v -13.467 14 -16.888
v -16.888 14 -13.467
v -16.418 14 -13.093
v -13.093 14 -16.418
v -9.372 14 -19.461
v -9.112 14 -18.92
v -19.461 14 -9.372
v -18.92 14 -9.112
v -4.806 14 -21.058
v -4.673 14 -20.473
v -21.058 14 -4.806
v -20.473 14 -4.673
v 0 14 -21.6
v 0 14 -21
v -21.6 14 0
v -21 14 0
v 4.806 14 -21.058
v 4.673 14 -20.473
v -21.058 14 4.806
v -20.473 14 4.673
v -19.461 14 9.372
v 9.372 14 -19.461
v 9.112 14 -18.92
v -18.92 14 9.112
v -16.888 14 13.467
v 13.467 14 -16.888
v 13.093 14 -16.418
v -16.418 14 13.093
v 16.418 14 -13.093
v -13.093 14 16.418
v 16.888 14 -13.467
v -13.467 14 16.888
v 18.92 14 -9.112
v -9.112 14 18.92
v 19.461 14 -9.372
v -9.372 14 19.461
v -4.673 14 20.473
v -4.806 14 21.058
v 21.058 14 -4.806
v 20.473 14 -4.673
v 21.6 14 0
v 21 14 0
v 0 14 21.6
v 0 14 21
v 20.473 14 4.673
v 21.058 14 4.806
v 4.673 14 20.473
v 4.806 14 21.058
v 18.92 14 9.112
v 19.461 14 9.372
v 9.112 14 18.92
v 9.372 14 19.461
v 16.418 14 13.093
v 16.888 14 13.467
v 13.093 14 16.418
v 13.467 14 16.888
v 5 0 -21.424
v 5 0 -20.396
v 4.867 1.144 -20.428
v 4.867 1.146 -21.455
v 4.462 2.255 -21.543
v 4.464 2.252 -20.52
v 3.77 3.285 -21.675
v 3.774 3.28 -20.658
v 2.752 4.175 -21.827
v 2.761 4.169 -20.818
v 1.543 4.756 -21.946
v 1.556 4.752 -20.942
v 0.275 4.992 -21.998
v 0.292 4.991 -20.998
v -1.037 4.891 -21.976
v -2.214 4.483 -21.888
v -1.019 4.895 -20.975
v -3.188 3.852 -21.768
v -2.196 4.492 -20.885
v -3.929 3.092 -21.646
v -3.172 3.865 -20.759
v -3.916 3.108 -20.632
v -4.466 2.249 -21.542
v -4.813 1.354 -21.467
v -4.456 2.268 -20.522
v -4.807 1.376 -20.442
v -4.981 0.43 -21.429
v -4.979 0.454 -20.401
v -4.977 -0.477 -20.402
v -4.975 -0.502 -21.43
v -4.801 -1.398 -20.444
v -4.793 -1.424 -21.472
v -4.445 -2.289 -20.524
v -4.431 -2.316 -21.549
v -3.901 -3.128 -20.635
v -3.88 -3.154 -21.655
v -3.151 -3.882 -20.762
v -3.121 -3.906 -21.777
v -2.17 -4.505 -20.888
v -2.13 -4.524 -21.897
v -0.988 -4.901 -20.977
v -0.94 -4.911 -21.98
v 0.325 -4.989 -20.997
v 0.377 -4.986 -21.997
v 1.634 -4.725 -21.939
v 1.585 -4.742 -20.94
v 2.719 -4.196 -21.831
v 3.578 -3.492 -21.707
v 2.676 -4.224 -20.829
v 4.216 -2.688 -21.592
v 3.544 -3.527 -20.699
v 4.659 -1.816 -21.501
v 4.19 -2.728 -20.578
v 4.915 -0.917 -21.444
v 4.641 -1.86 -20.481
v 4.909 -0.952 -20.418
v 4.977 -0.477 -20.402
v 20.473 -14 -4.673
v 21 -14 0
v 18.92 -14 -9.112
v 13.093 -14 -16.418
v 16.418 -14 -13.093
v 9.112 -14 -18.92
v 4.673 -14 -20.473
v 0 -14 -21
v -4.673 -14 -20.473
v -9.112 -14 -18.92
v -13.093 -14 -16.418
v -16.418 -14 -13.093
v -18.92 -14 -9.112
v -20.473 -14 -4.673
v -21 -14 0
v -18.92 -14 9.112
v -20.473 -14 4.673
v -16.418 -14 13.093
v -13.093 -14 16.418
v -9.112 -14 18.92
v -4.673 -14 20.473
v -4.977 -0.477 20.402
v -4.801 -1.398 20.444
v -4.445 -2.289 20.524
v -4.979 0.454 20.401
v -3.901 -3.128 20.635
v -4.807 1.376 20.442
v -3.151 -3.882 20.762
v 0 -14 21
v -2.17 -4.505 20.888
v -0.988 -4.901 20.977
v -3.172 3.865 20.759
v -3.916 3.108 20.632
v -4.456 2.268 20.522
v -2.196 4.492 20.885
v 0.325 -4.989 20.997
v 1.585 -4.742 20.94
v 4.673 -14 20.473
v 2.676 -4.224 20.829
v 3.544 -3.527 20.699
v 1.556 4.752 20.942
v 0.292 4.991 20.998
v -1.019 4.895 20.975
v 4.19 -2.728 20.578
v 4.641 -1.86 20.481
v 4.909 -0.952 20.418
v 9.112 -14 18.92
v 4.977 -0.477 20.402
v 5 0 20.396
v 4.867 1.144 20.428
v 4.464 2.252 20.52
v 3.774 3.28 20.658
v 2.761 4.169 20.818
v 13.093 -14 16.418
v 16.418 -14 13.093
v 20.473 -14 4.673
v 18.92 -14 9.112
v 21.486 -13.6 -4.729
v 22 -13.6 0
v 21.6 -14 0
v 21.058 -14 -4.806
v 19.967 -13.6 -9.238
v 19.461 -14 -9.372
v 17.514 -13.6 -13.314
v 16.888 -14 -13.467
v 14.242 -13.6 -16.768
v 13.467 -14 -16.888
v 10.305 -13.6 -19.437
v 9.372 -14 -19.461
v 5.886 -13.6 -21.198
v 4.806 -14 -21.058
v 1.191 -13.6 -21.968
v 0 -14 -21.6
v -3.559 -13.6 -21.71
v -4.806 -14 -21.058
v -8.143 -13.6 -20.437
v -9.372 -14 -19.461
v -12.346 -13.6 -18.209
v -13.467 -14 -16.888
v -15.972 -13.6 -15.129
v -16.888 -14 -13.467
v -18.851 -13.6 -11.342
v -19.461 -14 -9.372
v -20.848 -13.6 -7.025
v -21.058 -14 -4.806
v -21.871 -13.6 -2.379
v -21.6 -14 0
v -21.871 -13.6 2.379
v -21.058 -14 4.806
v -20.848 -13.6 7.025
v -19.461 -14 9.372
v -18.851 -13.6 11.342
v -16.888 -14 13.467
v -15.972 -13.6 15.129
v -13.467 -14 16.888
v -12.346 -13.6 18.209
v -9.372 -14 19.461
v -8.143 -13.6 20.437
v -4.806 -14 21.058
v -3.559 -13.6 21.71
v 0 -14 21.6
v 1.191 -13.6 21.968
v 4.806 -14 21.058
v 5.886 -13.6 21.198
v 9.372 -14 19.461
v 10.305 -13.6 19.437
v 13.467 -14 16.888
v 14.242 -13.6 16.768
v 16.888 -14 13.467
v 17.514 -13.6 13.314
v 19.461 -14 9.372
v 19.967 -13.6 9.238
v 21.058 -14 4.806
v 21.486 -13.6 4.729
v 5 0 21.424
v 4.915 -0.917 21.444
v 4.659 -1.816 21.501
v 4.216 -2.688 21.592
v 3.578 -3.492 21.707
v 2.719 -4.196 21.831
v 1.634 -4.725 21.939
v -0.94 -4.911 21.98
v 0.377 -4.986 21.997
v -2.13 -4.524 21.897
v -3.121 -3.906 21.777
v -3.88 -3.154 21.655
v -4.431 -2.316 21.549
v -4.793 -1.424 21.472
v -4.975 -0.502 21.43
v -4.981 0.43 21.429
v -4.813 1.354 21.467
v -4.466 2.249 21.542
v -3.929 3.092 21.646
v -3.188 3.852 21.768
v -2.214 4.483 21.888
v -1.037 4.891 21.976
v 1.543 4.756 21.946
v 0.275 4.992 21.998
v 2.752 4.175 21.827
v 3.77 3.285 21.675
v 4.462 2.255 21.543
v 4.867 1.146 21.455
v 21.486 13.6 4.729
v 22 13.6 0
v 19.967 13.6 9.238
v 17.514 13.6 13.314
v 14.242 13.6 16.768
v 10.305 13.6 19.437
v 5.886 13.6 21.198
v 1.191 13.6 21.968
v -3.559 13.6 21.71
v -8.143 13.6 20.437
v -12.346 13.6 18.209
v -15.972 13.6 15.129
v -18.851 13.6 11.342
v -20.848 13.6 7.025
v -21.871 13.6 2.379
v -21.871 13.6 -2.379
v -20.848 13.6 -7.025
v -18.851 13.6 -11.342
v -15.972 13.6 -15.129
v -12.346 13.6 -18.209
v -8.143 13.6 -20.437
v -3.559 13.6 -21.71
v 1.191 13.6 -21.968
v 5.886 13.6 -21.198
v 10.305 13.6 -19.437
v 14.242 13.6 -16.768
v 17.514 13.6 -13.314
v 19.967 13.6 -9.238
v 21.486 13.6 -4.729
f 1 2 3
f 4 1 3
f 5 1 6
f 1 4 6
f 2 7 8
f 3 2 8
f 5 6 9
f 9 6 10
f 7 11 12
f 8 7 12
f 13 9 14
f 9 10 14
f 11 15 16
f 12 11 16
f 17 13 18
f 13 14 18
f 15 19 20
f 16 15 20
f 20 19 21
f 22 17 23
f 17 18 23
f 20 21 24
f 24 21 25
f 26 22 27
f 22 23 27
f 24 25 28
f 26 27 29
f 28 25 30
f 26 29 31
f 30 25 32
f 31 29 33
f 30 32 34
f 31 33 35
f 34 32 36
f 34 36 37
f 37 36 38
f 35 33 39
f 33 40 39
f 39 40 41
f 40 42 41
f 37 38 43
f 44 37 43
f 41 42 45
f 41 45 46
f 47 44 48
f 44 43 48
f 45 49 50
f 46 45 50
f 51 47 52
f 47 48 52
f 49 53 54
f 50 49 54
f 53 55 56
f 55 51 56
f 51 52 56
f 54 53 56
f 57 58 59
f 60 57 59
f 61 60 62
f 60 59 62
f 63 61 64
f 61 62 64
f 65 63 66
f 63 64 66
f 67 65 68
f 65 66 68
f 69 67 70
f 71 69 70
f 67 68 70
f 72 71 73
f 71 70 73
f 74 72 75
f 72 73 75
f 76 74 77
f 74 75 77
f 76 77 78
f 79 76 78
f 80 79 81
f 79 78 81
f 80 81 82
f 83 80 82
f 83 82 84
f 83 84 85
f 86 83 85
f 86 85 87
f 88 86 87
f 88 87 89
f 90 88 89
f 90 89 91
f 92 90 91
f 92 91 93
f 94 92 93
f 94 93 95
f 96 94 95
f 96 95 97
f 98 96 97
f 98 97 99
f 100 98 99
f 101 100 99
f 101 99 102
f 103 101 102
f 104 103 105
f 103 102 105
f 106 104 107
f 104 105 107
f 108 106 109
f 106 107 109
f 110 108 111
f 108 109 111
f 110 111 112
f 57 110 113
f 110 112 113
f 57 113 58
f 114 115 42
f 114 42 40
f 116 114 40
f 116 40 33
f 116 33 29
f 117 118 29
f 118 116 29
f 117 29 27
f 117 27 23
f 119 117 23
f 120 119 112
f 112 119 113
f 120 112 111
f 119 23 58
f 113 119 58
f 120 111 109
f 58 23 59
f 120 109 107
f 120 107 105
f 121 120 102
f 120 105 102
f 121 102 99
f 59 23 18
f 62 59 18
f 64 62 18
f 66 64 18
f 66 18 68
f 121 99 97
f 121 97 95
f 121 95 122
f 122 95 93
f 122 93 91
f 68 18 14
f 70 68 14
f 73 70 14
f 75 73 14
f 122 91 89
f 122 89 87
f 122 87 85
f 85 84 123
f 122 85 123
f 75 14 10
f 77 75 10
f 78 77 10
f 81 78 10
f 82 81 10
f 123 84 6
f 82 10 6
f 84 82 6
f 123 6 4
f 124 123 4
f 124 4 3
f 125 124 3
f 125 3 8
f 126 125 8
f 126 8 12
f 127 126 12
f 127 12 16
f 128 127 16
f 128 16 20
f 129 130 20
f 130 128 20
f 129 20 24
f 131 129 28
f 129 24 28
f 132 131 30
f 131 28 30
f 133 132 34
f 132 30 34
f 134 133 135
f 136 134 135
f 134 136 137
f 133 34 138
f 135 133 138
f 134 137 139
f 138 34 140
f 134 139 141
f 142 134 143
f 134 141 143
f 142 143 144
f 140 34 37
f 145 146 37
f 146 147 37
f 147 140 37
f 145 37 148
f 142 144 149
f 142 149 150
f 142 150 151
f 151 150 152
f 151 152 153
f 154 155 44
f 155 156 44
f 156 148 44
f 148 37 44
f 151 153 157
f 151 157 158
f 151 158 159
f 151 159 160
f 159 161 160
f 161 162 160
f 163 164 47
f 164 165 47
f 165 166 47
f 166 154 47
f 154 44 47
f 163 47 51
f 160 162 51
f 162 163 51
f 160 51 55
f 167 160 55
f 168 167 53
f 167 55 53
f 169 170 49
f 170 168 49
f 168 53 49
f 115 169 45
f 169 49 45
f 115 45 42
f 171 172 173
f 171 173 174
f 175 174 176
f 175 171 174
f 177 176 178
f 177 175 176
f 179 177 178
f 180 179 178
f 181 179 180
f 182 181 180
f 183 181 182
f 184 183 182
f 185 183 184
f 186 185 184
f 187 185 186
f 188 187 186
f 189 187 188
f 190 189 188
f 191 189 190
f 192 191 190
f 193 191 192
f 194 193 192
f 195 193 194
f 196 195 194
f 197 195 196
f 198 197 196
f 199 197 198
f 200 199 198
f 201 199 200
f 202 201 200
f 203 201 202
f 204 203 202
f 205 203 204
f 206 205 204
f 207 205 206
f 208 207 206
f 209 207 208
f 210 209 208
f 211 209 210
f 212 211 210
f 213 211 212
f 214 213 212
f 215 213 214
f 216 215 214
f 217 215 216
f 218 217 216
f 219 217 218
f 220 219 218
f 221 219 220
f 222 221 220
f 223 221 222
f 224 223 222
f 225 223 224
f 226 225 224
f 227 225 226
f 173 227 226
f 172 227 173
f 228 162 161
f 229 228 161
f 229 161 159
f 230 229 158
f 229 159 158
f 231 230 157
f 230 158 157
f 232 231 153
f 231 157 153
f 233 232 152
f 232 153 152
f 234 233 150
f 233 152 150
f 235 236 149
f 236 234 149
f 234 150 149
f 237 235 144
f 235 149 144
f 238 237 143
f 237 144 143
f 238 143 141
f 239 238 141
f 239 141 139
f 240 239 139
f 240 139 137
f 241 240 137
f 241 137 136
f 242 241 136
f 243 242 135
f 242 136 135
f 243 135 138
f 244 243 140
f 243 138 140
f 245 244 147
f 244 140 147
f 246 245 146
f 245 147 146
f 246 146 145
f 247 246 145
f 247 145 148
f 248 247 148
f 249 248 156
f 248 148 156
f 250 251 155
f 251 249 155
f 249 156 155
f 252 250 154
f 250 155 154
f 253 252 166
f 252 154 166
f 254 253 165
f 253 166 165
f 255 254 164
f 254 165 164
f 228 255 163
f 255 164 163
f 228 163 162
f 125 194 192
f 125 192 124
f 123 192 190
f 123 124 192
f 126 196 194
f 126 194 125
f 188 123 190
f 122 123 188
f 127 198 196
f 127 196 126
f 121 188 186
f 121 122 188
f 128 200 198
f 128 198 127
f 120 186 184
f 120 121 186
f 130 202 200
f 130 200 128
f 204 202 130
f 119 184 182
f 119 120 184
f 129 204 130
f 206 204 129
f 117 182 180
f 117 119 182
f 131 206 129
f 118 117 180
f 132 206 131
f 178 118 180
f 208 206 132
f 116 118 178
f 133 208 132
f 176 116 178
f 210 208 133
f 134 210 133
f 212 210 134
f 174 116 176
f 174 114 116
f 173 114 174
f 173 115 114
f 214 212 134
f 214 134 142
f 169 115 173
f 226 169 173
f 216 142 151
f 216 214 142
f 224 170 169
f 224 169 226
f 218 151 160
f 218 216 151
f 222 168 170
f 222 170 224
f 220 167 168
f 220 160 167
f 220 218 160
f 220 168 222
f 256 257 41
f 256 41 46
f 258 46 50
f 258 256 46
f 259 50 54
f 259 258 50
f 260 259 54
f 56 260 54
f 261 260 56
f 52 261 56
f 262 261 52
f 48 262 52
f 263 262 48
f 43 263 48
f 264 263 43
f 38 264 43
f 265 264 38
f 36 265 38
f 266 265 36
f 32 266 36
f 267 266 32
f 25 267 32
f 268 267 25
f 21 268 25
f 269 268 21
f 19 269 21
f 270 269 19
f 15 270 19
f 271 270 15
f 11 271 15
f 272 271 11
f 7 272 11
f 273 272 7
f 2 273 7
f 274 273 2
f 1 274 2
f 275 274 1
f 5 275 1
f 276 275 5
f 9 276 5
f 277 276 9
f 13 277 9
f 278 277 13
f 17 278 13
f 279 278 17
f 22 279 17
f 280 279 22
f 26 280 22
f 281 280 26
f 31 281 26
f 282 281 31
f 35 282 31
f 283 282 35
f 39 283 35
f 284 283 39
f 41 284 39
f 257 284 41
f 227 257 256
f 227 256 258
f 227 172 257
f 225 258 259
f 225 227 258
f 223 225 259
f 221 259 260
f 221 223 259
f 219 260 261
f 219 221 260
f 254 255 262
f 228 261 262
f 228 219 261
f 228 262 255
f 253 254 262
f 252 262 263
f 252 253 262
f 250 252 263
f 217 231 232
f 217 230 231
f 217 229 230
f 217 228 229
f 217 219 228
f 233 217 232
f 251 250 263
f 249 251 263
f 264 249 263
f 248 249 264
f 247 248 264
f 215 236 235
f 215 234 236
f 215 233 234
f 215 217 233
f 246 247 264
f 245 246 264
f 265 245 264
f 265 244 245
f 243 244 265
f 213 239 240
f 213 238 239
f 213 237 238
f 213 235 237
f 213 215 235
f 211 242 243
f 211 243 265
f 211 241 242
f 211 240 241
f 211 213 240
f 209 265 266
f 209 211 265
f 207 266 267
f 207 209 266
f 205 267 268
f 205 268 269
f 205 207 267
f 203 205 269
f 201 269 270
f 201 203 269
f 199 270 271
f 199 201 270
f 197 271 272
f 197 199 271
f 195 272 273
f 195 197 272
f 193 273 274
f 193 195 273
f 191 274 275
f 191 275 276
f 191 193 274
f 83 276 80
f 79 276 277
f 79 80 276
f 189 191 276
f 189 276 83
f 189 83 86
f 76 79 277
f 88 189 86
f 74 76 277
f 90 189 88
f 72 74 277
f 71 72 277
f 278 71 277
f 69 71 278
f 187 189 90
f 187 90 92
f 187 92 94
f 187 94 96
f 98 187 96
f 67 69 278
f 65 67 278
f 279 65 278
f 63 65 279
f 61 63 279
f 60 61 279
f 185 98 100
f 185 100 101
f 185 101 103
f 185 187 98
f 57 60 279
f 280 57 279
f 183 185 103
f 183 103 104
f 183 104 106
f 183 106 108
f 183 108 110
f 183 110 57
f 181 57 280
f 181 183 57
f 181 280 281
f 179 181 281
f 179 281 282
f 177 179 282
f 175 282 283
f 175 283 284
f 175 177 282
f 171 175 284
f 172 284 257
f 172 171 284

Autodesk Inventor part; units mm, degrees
ref_plane "YZ Plane" through (0, 0, 0) normal (1, 0, 0) x (0, 1, 0)
ref_plane "XZ Plane" through (0, 0, 0) normal (0, 1, 0) x (-1, 0, 0)
ref_plane "XY Plane" through (0, 0, 0) normal (0, 0, 1) x (1, 0, 0)
sketch "Эскиз1" plane through (0, 0, 0) normal (0, 0, 1) x (1, 0, 0)
  line L0 (0, 14) -> (0, -14)
  line L1 (21, 14) -> (21.6, 14)
  line L2 (22, 13.6) -> (22, -13.6)
  line L3 (21.6, -14) -> (21, -14)
  line L4 (21, -14) -> (21, 14)
  line L5 (22, 13.6) -> (21.6, 14)
  line L6 (22, -13.6) -> (21.6, -14)
  point P0 (0, 0)
  point P1 (0, 0)
  point P2 (22, -14)
  point P3 (22, 14)
  dimension "d0" = 28
  dimension "d1" = 44
  dimension "d2" = 42
  dimension "d3" = 0.4
  dimension "d4" = 45
  dimension "d5" = 0.4
  dimension "d6" = 45
revolve "Вращение1" add sketch "Эскиз1" angle 360 about axis through (0, 14, 0) along (0, -1, 0)
sketch "Эскиз2" plane through (0, 0, 0) normal (0, 0, 1) x (1, 0, 0)
  circle A0 centre (0, 0) radius 5
  dimension "d8" = 10
extrude "Выдавливание1" cut sketch "Эскиз2" along normal through all both and the other way through all
equation "\"d5\" = d3"
equation "\"d6\" = d4"
properties part number "75. Втулка шестерни второй передачи"
